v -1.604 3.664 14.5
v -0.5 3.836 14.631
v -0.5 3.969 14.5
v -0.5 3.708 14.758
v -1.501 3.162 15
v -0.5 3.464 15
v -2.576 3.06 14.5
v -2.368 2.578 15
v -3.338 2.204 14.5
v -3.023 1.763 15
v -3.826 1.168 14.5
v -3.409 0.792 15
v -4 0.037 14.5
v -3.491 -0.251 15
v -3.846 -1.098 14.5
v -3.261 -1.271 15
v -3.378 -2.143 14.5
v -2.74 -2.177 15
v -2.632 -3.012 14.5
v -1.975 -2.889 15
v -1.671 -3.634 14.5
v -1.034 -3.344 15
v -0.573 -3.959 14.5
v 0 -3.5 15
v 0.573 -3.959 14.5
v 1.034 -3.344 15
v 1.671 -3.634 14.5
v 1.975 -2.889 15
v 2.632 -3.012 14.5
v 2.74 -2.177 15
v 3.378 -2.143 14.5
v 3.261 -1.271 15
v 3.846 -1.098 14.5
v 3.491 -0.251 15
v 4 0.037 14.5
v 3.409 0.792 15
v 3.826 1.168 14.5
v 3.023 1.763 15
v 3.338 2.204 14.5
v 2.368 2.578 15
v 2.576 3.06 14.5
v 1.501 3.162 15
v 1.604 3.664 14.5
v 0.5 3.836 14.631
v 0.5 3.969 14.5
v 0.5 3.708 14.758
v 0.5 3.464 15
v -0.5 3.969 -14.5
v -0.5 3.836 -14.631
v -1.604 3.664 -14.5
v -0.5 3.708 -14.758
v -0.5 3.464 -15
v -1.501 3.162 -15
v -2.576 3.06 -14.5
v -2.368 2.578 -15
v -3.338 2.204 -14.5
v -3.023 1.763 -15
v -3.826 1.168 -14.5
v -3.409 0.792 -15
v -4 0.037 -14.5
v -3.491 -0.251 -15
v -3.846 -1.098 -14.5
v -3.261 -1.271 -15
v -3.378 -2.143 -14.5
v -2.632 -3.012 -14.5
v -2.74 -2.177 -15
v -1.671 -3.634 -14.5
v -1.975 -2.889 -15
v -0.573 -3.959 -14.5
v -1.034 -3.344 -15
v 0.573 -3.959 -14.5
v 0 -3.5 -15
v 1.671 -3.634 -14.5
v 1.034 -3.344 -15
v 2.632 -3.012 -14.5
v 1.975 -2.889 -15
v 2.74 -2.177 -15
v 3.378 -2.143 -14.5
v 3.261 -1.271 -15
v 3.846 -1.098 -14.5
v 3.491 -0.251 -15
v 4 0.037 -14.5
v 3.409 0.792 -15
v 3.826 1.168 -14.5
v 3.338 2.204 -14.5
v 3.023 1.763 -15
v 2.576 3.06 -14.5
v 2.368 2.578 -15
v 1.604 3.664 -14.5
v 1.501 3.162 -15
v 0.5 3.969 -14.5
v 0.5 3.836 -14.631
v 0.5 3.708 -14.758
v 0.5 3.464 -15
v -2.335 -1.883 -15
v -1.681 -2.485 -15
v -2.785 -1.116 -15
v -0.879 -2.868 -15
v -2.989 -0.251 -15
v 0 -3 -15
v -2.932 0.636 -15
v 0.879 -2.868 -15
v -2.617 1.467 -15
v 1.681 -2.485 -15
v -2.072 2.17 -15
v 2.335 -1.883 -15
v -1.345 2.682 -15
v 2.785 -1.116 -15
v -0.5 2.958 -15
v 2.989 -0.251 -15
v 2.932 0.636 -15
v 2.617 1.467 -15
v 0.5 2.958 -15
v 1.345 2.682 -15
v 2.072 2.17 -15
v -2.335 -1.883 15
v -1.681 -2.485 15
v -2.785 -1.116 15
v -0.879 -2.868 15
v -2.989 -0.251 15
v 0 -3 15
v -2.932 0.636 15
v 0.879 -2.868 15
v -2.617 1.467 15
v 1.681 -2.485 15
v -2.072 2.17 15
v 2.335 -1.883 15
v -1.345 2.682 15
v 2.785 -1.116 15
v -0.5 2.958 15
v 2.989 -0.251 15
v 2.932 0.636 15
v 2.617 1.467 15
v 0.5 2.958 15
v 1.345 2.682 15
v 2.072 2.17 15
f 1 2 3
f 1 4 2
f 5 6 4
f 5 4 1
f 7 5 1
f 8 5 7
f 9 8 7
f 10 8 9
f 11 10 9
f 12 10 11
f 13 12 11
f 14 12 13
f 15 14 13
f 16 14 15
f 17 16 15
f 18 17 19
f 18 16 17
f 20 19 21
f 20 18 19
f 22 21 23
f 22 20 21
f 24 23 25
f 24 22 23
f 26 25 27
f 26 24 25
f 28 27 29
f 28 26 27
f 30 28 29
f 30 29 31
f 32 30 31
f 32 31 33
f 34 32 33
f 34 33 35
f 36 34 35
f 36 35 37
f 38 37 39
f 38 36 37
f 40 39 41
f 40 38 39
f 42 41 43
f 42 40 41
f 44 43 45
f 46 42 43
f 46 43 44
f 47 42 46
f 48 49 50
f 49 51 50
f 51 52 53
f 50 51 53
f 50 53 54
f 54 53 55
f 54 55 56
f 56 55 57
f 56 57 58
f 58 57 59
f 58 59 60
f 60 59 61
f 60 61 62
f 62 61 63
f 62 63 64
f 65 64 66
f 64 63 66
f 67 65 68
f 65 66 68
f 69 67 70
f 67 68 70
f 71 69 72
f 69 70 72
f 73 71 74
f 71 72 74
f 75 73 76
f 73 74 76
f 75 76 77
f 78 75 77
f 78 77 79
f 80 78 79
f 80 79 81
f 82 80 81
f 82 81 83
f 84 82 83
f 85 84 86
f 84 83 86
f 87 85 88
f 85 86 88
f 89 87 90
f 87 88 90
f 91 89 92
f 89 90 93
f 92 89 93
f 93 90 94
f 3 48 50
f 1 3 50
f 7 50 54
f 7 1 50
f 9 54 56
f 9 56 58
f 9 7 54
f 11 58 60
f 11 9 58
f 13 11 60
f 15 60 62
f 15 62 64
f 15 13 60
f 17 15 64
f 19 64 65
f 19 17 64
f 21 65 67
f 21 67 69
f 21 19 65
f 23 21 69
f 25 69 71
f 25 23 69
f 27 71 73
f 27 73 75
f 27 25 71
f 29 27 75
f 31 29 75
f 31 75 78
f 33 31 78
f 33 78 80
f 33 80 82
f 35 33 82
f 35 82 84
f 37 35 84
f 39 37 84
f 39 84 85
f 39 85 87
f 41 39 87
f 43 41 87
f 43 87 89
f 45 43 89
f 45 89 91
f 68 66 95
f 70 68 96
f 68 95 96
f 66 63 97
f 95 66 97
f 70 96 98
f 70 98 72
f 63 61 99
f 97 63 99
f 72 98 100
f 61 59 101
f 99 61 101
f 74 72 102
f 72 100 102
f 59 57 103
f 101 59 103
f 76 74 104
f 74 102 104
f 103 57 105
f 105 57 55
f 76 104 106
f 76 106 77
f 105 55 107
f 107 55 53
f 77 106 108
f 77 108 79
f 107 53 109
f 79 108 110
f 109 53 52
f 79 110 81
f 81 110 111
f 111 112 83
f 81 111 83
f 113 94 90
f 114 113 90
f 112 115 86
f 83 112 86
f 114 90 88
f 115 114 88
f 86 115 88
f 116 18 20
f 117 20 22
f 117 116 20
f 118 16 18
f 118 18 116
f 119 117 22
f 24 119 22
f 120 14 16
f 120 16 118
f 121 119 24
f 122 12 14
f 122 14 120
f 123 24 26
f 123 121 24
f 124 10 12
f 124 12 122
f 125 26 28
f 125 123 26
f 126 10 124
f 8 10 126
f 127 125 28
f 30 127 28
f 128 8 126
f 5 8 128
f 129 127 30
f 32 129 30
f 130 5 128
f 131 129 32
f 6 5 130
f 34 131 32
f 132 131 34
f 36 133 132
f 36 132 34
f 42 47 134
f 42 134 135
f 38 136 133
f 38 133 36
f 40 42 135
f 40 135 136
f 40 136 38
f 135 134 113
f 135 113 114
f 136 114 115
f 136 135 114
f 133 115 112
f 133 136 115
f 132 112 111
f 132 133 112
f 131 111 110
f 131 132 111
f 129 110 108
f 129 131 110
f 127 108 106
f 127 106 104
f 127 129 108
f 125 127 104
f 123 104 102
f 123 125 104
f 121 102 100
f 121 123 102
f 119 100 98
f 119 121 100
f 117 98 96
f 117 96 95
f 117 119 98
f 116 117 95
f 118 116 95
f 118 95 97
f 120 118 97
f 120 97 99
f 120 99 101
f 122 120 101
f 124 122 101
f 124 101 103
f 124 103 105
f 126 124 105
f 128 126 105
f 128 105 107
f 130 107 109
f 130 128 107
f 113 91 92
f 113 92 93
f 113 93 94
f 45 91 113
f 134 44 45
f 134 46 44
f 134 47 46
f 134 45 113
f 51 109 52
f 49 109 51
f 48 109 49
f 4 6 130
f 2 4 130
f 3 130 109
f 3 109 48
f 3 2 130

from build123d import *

# Parameters (mm, degrees)
EXTRUSION1_DEPTH      = 15
EXTRUSION1_DEPTH_BACK = 15
CHANFREIN1_SIZE       = 0.5


with BuildPart() as part:
    # Esquisse1 → Extrusion1 (new body, two sides)
    with BuildSketch(Plane.XY) as extrusion1_sk:
        with BuildLine():
            Line((0.5, 3.968626967), (0.5, 2.958039892))
            ThreePointArc((0.5, 2.958039892), (0, -3), (-0.5, 2.958039892))
            Line((-0.5, 2.958039892), (-0.5, 3.968626967))
            ThreePointArc((-0.5, 3.968626967), (0, -4), (0.5, 3.968626967))
        make_face()
    extrude(amount=EXTRUSION1_DEPTH)
    extrude(extrusion1_sk.sketch, amount=-EXTRUSION1_DEPTH_BACK)

    # Chanfrein1
    chanfrein1_edges = [part.edges().sort_by_distance(p)[0] for p in [
        (0, -4, -15),
        (0, -4, 15),
    ]]
    chamfer(chanfrein1_edges, length=CHANFREIN1_SIZE)


solid = part.part
